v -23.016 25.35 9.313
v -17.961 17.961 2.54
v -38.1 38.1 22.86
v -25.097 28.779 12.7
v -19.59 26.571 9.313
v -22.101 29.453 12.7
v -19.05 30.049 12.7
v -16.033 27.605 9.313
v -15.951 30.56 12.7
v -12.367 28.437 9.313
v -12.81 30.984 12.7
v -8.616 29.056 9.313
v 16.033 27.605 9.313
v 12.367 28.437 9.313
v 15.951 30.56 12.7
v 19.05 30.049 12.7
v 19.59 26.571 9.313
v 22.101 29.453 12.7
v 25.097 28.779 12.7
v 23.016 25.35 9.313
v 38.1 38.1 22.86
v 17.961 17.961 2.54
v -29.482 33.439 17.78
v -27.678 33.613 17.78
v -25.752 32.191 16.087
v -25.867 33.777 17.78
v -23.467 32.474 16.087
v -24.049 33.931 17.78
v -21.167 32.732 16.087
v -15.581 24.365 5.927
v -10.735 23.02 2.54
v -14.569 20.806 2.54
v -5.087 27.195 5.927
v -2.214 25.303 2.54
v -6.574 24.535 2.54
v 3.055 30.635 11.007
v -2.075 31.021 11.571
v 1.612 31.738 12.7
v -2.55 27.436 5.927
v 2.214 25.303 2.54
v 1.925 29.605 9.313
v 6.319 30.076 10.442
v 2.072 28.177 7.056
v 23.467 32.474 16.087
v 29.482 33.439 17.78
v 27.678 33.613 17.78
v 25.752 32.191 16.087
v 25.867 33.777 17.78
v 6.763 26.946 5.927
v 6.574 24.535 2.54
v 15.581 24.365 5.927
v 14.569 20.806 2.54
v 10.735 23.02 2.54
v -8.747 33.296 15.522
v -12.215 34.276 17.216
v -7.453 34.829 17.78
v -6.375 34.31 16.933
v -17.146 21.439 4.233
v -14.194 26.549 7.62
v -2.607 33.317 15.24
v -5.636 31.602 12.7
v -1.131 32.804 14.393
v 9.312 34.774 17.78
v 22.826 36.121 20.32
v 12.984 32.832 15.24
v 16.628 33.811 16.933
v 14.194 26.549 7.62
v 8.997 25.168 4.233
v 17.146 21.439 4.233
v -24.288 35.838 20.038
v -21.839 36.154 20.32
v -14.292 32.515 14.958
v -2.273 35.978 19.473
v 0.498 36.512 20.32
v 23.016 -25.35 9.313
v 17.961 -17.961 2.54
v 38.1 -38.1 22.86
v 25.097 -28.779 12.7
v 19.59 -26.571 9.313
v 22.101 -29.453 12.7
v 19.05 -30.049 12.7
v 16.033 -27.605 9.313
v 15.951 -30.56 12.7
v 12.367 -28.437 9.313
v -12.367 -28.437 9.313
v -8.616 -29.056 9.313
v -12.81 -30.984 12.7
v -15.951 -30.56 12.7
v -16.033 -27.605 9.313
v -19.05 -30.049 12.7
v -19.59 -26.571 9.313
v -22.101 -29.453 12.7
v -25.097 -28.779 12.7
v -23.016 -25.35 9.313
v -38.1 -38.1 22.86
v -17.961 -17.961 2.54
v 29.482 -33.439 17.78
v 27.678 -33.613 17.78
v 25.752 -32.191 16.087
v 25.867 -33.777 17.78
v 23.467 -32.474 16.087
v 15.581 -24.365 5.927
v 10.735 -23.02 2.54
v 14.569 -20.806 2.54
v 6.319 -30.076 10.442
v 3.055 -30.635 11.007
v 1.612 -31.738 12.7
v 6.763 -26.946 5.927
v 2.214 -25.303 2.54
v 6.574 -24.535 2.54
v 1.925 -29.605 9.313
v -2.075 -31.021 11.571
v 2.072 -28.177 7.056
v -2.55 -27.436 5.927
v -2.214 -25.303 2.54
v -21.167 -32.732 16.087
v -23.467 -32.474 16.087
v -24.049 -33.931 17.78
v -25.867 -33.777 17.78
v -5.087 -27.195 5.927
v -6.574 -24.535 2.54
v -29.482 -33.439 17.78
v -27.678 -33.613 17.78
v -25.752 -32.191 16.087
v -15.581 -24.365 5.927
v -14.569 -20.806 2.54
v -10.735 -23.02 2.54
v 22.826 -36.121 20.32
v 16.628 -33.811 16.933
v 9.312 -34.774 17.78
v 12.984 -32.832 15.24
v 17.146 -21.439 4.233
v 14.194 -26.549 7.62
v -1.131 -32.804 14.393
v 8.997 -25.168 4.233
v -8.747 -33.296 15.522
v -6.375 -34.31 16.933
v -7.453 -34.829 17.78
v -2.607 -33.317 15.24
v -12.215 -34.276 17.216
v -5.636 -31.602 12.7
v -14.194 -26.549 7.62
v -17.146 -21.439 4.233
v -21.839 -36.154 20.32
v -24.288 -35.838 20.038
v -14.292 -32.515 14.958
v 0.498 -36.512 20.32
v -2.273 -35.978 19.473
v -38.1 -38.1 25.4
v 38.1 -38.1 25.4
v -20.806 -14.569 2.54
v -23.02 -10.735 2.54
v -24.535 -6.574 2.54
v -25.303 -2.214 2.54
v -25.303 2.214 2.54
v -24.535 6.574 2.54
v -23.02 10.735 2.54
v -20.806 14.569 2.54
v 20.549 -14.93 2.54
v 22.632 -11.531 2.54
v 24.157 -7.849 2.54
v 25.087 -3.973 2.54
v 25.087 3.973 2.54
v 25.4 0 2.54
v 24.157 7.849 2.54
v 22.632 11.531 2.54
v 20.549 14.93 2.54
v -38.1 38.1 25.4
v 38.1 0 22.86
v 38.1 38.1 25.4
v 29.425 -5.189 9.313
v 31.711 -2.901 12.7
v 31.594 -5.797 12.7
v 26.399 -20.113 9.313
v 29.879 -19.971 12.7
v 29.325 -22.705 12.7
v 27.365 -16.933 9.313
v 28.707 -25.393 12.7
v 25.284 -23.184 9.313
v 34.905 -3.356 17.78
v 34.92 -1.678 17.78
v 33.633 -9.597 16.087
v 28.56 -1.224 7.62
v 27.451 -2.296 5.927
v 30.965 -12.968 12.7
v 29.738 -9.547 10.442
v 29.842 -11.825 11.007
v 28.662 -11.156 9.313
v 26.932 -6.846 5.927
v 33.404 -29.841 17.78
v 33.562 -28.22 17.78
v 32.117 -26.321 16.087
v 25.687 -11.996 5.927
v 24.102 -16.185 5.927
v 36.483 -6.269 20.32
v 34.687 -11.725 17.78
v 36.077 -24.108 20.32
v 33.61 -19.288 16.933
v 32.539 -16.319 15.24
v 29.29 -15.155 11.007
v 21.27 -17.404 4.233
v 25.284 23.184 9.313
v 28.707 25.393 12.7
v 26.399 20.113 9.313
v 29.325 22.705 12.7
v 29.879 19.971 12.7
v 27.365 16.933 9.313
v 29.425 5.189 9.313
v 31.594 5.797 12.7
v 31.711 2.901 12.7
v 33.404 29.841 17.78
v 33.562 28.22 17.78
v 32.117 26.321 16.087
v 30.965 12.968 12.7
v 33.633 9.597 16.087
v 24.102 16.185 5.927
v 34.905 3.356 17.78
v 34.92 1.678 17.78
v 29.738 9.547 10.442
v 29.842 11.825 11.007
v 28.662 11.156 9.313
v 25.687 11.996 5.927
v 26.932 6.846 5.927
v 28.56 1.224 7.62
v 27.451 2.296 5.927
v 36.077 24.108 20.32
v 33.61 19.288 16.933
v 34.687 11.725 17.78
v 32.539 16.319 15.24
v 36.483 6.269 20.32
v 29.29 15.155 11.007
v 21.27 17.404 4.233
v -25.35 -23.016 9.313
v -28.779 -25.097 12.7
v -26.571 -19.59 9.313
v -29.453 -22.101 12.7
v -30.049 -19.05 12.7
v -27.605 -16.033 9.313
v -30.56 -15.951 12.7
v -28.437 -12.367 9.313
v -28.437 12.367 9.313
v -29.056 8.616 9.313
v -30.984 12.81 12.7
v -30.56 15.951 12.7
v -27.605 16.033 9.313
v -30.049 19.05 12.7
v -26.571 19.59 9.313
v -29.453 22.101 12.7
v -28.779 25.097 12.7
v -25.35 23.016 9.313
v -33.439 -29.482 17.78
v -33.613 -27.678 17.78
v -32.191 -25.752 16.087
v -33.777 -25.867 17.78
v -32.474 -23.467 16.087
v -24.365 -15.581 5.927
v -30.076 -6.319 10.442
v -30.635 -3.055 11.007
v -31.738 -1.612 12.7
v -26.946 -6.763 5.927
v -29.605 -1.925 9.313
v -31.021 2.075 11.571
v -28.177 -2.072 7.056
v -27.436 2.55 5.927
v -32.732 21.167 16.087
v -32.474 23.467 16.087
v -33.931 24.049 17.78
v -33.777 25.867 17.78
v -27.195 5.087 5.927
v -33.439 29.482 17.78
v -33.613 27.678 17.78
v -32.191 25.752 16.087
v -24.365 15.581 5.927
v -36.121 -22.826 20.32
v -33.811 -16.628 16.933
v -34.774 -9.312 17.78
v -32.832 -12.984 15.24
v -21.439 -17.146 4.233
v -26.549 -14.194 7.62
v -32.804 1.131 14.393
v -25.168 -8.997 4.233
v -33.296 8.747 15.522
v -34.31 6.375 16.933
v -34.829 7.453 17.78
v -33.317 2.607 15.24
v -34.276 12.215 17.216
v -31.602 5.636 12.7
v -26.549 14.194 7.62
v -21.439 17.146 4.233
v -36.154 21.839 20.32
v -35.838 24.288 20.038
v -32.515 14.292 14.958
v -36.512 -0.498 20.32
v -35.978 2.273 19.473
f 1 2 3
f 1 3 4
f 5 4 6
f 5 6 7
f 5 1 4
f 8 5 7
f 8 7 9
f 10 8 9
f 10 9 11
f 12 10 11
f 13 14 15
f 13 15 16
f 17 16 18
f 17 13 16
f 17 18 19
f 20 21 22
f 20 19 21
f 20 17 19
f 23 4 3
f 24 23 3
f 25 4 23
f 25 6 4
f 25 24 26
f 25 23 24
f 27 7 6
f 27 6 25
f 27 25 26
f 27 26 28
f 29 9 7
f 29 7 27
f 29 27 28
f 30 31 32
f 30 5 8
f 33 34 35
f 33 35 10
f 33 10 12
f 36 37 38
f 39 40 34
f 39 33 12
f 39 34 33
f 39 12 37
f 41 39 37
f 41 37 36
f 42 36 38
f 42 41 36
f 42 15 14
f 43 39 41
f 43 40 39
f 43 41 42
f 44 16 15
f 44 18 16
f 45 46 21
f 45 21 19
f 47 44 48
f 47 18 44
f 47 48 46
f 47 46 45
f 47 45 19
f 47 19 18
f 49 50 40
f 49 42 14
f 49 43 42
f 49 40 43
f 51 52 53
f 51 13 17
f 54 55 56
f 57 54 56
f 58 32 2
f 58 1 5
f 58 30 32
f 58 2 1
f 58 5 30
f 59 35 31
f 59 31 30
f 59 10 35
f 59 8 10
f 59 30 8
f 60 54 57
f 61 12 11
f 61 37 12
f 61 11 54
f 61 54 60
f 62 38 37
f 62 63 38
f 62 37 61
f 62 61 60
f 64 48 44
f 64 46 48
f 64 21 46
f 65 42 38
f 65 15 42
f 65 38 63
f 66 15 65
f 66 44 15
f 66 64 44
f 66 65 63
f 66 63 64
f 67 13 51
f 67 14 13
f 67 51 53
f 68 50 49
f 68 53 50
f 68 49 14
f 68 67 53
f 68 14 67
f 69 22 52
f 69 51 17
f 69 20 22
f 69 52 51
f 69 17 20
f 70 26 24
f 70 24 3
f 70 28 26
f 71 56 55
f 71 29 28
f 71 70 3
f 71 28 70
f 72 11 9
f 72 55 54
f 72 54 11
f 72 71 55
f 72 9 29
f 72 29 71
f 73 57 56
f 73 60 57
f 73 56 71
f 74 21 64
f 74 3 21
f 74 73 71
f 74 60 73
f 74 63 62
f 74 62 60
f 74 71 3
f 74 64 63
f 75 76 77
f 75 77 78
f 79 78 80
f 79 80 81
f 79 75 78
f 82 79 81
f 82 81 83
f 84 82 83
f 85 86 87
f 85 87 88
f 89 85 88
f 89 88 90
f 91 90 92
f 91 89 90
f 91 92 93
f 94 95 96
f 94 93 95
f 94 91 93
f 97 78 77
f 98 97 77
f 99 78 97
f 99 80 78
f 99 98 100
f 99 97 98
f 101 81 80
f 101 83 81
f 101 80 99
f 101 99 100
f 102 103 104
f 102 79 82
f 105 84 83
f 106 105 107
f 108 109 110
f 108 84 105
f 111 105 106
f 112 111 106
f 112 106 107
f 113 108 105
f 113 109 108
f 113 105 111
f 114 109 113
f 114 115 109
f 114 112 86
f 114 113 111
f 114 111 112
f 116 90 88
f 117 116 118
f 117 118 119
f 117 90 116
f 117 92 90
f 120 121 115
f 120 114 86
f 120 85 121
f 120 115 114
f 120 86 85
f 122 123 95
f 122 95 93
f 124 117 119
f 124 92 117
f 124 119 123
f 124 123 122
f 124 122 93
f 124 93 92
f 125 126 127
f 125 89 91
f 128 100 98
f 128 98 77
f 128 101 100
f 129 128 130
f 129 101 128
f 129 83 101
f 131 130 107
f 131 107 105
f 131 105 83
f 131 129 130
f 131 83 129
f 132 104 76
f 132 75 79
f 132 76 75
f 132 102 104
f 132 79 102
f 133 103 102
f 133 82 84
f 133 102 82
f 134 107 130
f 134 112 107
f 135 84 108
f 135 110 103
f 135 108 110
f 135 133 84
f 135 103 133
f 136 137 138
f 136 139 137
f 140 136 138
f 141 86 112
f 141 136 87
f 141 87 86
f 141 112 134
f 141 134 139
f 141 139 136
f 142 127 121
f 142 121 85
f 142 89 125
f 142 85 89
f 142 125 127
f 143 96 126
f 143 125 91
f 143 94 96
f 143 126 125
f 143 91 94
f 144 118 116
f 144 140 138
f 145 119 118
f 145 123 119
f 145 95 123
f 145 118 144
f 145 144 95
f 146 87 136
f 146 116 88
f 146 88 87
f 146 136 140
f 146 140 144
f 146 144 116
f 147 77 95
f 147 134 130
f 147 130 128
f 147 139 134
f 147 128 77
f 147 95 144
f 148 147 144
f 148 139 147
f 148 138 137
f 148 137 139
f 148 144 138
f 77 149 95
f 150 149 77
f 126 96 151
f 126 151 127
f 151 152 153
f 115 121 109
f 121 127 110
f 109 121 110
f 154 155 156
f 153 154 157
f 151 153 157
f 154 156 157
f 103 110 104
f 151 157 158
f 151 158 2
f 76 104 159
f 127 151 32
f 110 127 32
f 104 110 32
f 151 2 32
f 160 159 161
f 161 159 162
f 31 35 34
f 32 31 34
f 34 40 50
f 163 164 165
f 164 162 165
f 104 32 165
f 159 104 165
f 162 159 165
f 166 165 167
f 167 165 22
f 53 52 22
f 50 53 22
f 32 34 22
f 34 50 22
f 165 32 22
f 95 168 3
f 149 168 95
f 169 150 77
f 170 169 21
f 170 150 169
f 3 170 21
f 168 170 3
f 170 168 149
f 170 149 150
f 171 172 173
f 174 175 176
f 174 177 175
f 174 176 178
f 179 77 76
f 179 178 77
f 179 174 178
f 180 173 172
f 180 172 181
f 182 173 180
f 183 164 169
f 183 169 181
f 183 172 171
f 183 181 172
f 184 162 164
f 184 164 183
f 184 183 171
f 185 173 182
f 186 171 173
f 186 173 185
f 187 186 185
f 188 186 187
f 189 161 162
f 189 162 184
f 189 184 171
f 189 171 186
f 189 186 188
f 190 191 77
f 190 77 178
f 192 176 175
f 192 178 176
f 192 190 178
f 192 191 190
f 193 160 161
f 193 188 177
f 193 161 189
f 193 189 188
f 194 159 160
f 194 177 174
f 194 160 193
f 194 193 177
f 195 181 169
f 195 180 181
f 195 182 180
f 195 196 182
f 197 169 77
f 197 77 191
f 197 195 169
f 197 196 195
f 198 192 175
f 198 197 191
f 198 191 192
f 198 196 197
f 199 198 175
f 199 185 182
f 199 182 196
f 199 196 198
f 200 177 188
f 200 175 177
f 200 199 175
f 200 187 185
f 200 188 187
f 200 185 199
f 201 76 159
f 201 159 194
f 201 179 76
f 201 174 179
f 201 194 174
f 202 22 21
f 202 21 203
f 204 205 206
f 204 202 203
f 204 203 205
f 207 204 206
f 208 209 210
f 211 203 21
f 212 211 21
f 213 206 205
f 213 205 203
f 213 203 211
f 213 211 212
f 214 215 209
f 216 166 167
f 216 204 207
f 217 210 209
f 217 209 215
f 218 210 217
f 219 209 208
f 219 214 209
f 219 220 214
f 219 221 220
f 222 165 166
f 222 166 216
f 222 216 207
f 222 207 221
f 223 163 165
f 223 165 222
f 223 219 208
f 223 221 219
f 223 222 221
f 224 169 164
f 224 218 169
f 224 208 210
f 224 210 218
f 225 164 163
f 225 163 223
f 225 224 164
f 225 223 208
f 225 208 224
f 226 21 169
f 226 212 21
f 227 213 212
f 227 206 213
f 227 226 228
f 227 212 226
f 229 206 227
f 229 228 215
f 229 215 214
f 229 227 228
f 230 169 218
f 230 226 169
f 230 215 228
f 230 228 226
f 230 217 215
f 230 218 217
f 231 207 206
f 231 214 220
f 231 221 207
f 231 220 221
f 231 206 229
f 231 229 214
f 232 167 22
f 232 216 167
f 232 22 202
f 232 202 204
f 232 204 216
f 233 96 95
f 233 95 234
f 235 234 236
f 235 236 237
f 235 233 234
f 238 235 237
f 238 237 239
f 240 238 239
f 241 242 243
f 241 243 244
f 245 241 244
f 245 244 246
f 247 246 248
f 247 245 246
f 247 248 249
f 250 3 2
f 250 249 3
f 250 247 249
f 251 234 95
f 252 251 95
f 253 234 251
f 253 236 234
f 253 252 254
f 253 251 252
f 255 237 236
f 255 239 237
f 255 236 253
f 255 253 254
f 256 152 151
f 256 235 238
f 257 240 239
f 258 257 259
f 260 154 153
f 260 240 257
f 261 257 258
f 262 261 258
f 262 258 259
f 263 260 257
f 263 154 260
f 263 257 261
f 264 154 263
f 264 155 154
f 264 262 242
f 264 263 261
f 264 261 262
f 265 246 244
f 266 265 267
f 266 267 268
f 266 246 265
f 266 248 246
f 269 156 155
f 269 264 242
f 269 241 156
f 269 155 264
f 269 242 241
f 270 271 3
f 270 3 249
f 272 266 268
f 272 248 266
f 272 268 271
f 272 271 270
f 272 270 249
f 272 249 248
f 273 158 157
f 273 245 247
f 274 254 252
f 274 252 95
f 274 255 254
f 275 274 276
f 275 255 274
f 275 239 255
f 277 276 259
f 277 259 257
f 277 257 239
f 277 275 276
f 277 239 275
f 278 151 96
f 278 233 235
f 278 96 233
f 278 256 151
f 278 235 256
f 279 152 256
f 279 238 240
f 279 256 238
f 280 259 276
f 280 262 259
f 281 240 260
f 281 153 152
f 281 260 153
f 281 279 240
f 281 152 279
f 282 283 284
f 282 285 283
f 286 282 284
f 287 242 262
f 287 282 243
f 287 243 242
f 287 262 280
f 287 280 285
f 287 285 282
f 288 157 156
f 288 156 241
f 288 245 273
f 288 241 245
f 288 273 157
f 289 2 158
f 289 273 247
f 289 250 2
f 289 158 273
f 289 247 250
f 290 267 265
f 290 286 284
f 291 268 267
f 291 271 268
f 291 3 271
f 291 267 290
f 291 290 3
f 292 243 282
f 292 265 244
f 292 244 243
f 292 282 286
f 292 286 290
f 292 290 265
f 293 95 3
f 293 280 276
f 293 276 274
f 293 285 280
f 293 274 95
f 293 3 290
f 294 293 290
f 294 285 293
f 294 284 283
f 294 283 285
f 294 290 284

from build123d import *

# Parameters (mm, degrees)
F0_R      = 25.4
F3_DEPTH  = 2.54
F4_DEPTH  = 2.54
F4_FACE_W = 76.2
F4_FACE_H = 76.2
F3_FACE_R = 25.4
F6_DEPTH  = 2.54


with BuildPart() as f3:
    # F0 (on Top) → F3 (new body)
    with BuildSketch(Plane.XY):
        Circle(F0_R)
    extrude(amount=F3_DEPTH)



with BuildPart() as f4:
    # F2 (on offset) → F4 (new body)
    with BuildSketch(Plane.XY.offset(25.4)):
        Polygon((38.1, -38.1), (38.1, 0), (38.1, 38.1), (-38.1, 38.1), (-38.1, -38.1), align=None)
    extrude(amount=-F4_DEPTH)


with BuildPart() as f3_1:
    add(f3.part)

    add(f4.part)  # F5 merges F4
    # F4_face (on face) → F5 section 0
    with BuildSketch(Plane(origin=(0, 0, 22.86), x_dir=(1, 0, 0), z_dir=(0, 0, -1))):
        Rectangle(F4_FACE_W, F4_FACE_H)
    # F3_face (on face) → F5 section 1
    with BuildSketch(Plane.XY.offset(2.54)):
        Circle(F3_FACE_R)
    loft()

    # F6 (cut): a face of the model
    f6_faces = [f3_1.faces().sort_by_distance(p)[0] for p in [
        (0, 0, 0),
    ]]
    extrude(f6_faces, amount=-F6_DEPTH, mode=Mode.SUBTRACT)


solid = f3_1.part
